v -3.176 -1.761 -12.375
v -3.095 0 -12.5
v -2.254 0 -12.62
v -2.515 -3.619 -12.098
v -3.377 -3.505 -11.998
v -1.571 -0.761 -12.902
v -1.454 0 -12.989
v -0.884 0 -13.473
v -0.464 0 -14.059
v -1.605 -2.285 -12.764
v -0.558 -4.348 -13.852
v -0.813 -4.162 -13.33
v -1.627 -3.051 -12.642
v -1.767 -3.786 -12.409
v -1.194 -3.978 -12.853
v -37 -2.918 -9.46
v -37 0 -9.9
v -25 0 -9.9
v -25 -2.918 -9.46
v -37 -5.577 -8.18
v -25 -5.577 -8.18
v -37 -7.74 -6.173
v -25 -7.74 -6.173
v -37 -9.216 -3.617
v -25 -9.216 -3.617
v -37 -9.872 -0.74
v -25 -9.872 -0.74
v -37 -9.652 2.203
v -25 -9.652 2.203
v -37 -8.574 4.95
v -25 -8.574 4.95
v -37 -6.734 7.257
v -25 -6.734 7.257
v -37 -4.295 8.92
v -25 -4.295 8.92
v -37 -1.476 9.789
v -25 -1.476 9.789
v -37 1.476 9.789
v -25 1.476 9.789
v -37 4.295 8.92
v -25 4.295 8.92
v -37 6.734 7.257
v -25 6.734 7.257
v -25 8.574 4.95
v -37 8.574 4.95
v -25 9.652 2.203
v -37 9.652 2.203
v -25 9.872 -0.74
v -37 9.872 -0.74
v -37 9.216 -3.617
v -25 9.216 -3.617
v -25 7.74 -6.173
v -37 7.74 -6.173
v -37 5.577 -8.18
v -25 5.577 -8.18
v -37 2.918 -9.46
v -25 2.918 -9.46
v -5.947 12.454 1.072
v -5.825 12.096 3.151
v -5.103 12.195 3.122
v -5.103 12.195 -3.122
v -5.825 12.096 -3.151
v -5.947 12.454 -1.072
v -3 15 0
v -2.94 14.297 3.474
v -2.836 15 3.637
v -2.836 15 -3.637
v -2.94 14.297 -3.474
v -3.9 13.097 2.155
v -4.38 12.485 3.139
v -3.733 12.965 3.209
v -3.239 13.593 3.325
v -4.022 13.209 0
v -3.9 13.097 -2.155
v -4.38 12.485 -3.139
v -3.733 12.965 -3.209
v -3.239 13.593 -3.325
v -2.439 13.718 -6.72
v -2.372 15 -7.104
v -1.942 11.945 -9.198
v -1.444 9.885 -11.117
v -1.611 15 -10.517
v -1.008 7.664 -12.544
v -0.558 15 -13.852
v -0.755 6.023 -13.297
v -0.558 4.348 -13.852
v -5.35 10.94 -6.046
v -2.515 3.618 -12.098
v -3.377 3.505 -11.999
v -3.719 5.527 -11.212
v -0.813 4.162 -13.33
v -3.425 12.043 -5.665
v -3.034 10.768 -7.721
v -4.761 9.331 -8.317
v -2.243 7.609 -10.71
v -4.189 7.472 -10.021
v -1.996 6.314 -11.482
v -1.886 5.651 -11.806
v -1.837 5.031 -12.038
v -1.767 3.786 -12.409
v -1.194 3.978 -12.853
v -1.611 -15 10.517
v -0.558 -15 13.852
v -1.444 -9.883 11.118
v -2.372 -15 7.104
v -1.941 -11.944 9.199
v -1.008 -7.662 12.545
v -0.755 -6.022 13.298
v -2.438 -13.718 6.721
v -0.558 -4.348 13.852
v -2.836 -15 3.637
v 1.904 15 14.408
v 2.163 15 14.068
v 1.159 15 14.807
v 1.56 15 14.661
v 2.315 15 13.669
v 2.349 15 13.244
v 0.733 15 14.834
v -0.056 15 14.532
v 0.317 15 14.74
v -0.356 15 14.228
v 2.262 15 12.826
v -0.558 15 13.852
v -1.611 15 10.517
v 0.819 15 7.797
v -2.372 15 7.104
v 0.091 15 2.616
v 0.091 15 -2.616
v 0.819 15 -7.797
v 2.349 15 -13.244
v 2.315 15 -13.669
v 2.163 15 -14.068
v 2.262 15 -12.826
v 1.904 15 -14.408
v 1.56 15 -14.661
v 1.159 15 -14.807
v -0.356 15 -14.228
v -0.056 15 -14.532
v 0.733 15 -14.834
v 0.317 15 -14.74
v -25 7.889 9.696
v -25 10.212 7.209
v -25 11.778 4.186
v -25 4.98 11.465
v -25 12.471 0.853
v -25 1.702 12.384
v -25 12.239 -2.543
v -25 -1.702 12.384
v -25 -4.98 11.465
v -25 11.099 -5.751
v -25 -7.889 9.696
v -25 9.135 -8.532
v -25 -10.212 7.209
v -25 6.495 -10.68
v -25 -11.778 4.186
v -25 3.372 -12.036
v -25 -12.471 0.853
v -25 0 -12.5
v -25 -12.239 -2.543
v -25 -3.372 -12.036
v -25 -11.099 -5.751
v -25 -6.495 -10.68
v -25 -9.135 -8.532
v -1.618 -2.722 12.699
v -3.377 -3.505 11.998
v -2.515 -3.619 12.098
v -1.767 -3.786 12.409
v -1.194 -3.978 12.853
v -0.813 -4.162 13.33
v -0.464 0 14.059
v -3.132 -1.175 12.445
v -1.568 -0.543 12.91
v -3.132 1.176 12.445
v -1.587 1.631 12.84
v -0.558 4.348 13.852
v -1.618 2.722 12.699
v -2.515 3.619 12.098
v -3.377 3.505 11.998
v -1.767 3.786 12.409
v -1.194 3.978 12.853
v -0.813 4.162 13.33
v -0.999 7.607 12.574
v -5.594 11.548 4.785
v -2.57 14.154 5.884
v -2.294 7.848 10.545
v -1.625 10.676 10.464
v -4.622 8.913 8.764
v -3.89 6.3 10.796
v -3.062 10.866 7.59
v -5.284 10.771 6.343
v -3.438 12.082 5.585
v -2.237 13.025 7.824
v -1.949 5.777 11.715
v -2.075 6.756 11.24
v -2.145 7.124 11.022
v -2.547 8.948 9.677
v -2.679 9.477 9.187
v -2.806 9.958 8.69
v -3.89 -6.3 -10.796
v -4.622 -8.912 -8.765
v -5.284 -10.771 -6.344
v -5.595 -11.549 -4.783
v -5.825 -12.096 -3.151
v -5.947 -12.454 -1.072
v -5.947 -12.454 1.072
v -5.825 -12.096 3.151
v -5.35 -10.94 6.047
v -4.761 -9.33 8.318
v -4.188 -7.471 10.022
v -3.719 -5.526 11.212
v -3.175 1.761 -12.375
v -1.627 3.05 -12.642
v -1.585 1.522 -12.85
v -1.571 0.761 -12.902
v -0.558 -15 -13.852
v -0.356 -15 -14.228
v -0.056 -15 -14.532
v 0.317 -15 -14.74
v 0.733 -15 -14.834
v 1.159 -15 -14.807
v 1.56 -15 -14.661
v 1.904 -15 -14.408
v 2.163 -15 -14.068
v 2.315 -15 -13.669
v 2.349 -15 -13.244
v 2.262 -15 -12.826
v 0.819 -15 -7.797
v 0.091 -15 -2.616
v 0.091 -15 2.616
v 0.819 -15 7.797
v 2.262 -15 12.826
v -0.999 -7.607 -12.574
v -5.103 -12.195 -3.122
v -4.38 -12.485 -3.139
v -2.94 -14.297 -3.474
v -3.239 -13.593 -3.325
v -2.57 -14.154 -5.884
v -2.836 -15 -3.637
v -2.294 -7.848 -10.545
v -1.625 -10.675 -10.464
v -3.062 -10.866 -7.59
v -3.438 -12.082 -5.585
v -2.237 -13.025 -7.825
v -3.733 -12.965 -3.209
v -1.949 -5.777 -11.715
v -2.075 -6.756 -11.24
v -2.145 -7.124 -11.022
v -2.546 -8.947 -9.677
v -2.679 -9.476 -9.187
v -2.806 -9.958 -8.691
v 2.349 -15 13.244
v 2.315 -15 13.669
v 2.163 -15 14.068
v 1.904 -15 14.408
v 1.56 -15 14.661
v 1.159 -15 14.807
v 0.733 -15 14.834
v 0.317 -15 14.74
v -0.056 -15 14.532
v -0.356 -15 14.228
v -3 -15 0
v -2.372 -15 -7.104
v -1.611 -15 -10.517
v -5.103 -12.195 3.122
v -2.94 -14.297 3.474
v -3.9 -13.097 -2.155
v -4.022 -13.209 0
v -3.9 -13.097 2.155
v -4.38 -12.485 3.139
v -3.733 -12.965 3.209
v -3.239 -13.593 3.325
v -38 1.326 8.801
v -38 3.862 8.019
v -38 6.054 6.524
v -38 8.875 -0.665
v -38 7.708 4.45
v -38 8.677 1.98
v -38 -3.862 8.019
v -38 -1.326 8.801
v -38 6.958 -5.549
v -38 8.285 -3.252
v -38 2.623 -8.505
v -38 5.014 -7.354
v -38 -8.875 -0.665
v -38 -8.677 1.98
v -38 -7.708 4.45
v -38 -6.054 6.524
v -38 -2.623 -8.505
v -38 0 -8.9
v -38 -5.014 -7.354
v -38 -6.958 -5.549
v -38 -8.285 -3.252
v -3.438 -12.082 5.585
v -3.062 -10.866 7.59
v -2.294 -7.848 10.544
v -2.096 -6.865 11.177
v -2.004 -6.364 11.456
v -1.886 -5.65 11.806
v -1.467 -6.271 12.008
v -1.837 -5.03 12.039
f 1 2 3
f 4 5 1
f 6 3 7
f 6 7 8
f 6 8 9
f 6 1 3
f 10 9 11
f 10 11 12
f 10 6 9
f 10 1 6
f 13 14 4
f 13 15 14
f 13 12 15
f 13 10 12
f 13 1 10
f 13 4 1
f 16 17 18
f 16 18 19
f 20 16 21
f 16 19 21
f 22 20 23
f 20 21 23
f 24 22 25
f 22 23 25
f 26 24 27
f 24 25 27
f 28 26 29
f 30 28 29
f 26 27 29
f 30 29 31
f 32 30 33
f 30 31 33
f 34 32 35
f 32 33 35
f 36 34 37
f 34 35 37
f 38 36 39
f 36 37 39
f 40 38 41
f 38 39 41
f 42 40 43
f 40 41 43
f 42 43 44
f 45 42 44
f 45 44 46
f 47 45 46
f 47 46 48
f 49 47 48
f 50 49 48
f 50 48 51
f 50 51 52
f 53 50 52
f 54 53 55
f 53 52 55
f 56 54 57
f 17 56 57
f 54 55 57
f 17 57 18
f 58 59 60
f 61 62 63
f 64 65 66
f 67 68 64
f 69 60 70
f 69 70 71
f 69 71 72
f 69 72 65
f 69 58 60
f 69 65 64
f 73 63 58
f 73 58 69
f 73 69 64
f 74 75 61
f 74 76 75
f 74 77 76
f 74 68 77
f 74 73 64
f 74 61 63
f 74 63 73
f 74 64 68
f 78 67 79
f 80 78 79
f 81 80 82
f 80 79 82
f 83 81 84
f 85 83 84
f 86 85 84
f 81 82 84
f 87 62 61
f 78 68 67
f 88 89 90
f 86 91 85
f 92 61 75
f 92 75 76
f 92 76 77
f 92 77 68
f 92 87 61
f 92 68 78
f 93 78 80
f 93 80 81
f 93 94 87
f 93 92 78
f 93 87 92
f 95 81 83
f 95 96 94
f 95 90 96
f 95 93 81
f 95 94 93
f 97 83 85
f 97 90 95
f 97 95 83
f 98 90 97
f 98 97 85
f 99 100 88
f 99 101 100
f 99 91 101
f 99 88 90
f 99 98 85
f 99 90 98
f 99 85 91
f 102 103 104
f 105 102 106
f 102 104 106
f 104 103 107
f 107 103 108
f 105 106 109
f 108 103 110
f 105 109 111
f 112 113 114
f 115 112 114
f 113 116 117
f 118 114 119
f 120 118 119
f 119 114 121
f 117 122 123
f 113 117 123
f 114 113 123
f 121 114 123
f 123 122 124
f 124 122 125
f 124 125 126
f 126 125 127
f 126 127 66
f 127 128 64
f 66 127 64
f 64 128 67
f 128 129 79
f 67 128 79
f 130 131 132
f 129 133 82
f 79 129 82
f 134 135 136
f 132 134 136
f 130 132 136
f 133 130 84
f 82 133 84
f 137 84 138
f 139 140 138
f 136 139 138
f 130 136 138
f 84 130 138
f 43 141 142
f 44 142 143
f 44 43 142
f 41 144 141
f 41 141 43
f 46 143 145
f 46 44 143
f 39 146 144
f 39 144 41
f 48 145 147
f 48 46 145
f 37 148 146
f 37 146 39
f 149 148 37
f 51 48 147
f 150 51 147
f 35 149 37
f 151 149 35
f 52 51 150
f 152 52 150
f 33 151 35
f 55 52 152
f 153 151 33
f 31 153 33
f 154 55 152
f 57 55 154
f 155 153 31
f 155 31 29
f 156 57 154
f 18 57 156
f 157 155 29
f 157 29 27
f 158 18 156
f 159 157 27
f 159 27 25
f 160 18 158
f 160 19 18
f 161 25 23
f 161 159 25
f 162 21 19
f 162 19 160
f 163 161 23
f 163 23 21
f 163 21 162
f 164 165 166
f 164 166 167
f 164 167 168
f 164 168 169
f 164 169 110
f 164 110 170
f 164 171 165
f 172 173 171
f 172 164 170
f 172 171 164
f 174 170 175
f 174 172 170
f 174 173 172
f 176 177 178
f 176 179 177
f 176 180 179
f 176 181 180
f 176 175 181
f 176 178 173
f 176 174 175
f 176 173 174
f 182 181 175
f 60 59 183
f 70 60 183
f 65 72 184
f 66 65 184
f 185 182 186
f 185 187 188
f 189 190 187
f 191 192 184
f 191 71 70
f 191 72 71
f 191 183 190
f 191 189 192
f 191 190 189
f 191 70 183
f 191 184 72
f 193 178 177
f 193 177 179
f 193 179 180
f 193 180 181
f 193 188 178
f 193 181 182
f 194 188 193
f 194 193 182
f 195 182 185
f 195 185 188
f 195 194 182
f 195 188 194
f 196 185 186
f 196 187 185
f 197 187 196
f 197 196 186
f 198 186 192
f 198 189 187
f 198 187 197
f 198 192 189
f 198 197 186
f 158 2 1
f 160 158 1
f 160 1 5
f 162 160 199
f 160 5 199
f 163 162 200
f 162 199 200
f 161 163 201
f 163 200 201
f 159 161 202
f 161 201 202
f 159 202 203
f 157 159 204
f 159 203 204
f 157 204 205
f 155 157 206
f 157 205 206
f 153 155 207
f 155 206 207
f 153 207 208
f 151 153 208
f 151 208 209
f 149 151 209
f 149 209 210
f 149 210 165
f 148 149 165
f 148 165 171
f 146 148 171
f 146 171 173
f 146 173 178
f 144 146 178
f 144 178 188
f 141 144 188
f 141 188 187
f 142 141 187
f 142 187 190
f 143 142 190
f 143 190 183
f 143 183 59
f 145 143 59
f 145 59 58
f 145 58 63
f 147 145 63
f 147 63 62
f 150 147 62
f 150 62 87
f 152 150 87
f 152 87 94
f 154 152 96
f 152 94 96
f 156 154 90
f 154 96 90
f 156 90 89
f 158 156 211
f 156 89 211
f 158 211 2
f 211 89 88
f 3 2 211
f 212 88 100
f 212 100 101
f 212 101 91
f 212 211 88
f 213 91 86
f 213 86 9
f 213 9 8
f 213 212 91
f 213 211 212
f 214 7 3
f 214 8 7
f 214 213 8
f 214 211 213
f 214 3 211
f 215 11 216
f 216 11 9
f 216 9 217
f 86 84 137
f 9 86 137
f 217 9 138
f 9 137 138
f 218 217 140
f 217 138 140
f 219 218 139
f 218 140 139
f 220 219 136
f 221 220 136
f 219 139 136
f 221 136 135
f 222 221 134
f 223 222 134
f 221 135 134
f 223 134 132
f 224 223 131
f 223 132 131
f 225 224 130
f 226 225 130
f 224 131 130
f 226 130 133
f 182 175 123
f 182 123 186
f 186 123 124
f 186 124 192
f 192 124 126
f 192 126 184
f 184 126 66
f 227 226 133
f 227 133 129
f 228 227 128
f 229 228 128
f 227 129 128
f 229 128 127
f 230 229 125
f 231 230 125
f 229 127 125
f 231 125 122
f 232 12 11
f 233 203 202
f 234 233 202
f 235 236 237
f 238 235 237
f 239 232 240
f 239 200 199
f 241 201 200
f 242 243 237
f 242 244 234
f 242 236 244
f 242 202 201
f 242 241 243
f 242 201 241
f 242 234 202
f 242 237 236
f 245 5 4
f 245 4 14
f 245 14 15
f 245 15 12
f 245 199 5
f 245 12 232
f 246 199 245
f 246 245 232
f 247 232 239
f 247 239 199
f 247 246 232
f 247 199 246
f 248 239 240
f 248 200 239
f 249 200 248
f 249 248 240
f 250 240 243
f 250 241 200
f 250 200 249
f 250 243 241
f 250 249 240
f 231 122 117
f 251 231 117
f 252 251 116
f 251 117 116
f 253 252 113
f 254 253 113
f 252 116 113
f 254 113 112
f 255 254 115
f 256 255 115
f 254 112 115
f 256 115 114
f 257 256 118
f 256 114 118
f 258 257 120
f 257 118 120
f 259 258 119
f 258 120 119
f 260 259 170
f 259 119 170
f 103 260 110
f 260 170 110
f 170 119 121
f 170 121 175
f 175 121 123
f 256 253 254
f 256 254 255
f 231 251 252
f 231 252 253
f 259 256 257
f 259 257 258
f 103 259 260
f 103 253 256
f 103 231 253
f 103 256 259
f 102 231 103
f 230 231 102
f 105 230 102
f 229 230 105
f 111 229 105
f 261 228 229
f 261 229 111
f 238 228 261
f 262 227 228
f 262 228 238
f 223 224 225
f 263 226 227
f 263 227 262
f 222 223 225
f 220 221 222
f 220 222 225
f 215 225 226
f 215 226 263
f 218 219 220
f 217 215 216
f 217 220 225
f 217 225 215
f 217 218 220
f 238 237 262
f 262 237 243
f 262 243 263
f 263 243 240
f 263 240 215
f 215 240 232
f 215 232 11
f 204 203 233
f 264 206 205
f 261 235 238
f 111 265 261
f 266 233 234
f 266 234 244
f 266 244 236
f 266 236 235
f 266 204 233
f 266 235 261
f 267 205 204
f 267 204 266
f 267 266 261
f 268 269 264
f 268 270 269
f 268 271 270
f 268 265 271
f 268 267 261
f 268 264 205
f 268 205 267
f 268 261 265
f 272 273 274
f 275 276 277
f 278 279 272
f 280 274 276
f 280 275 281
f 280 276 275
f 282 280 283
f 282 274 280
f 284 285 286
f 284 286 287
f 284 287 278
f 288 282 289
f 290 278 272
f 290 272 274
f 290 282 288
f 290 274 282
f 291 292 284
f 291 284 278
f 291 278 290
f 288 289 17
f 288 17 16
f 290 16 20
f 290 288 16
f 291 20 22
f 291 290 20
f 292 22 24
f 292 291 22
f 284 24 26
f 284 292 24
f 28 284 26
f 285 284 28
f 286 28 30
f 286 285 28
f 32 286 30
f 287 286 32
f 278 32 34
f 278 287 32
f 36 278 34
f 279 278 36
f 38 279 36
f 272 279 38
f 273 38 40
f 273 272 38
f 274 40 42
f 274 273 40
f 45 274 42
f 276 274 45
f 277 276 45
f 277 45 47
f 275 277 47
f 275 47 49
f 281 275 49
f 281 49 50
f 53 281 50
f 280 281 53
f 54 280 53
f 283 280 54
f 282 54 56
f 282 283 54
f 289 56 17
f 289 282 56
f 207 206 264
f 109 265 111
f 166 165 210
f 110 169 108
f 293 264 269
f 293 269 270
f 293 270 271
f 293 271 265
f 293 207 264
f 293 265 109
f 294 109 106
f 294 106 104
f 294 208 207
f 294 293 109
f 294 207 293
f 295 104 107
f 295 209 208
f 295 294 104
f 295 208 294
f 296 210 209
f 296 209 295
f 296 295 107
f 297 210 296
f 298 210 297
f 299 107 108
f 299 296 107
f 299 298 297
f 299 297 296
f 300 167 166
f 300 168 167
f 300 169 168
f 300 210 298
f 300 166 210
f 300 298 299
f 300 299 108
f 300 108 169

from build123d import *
from build123d.topology import SkipClean

# Parameters (mm, degrees)
BOSS_EXTRUDE1_DEPTH                  = 15
SKETCH2_R                            = 12.5
BOSS_EXTRUDE2_DEPTH                  = 22
BOSS_EXTRUDE2_DIRECTION_2_REACH      = 23.768
BOSS_EXTRUDE2_DIRECTION_2_END_RADIUS = 40.5
SKETCH3_R                            = 9.9
BOSS_EXTRUDE3_DEPTH                  = 13
CHAMFER1_SIZE                        = 1
FILLET7_R                            = 3


with BuildPart() as part:
    # Sketch1 → Boss-Extrude1 (new, symmetric)
    with BuildSketch(Plane(origin=(0, 0, 0), x_dir=(1, 0, 0), z_dir=(0, 1, 0))):
        with BuildLine():
            ThreePointArc((2.261526721, 12.825755375), (0, 0), (2.261526721, -12.825755375))
            ThreePointArc((2.261526721, -12.825755375), (1.365018004, -14.748324521), (-0.557551142, -13.851815805))
            ThreePointArc((-0.557551142, -13.851815805), (-3, 0), (-0.557551142, 13.851815805))
            ThreePointArc((-0.557551142, 13.851815805), (1.365018004, 14.748324521), (2.261526721, 12.825755375))
        make_face()
    extrude(amount=BOSS_EXTRUDE1_DEPTH, both=True)

    # Sketch2 → Boss-Extrude2 (add)
    with BuildSketch(Plane.ZY.offset(3)):
        with Locations(Location((0, 0, 0), (0, 0, 180))):
            Circle(SKETCH2_R)
    extrude(amount=BOSS_EXTRUDE2_DEPTH)

    # Boss-Extrude2 direction 2: up to this cylinder (the profile starts outside it)
    with SkipClean():  # the faces are left unmerged after this step: merging them gives an invalid solid
        boss_extrude2_direction_2_end = Plane(origin=(37.5, 0, 0), z_dir=(0, -1, 0)) * Cylinder(BOSS_EXTRUDE2_DIRECTION_2_END_RADIUS, 129.536, mode=Mode.PRIVATE)
        # Sketch2 → Boss-Extrude2 direction 2 (add, up to the surface)
        with BuildSketch(Plane.ZY.offset(3), mode=Mode.PRIVATE) as boss_extrude2_direction_2_sk1:
            with Locations(Location((0, 0, 0), (0, 0, 180))):
                Circle(SKETCH2_R)
        boss_extrude2_direction_2_tool1 = extrude(boss_extrude2_direction_2_sk1.sketch, amount=-BOSS_EXTRUDE2_DIRECTION_2_REACH, mode=Mode.PRIVATE) - boss_extrude2_direction_2_end
        add(boss_extrude2_direction_2_tool1.solids().sort_by_distance((-3, 0, 0))[0])
        add(boss_extrude2_direction_2_tool1.solids().sort_by_distance((-3, 0, 0))[1])

    # Sketch3 → Boss-Extrude3 (add)
    with BuildSketch(Plane.ZY.offset(25)):
        with Locations(Location((0, 0, 0), (0, 0, 180))):
            Circle(SKETCH3_R)
    extrude(amount=BOSS_EXTRUDE3_DEPTH)

    # Chamfer1
    chamfer1_edges = [part.edges().sort_by_distance(p)[0] for p in [
        (-38, 0, 9.9),
    ]]
    chamfer(chamfer1_edges, length=CHAMFER1_SIZE)

    # Fillet7
    fillet7_edges = [part.edges().sort_by_distance(p)[0] for p in [
        (-1.022720569, 0, 12.5),
    ]]
    fillet(fillet7_edges, radius=FILLET7_R)


solid = part.part
